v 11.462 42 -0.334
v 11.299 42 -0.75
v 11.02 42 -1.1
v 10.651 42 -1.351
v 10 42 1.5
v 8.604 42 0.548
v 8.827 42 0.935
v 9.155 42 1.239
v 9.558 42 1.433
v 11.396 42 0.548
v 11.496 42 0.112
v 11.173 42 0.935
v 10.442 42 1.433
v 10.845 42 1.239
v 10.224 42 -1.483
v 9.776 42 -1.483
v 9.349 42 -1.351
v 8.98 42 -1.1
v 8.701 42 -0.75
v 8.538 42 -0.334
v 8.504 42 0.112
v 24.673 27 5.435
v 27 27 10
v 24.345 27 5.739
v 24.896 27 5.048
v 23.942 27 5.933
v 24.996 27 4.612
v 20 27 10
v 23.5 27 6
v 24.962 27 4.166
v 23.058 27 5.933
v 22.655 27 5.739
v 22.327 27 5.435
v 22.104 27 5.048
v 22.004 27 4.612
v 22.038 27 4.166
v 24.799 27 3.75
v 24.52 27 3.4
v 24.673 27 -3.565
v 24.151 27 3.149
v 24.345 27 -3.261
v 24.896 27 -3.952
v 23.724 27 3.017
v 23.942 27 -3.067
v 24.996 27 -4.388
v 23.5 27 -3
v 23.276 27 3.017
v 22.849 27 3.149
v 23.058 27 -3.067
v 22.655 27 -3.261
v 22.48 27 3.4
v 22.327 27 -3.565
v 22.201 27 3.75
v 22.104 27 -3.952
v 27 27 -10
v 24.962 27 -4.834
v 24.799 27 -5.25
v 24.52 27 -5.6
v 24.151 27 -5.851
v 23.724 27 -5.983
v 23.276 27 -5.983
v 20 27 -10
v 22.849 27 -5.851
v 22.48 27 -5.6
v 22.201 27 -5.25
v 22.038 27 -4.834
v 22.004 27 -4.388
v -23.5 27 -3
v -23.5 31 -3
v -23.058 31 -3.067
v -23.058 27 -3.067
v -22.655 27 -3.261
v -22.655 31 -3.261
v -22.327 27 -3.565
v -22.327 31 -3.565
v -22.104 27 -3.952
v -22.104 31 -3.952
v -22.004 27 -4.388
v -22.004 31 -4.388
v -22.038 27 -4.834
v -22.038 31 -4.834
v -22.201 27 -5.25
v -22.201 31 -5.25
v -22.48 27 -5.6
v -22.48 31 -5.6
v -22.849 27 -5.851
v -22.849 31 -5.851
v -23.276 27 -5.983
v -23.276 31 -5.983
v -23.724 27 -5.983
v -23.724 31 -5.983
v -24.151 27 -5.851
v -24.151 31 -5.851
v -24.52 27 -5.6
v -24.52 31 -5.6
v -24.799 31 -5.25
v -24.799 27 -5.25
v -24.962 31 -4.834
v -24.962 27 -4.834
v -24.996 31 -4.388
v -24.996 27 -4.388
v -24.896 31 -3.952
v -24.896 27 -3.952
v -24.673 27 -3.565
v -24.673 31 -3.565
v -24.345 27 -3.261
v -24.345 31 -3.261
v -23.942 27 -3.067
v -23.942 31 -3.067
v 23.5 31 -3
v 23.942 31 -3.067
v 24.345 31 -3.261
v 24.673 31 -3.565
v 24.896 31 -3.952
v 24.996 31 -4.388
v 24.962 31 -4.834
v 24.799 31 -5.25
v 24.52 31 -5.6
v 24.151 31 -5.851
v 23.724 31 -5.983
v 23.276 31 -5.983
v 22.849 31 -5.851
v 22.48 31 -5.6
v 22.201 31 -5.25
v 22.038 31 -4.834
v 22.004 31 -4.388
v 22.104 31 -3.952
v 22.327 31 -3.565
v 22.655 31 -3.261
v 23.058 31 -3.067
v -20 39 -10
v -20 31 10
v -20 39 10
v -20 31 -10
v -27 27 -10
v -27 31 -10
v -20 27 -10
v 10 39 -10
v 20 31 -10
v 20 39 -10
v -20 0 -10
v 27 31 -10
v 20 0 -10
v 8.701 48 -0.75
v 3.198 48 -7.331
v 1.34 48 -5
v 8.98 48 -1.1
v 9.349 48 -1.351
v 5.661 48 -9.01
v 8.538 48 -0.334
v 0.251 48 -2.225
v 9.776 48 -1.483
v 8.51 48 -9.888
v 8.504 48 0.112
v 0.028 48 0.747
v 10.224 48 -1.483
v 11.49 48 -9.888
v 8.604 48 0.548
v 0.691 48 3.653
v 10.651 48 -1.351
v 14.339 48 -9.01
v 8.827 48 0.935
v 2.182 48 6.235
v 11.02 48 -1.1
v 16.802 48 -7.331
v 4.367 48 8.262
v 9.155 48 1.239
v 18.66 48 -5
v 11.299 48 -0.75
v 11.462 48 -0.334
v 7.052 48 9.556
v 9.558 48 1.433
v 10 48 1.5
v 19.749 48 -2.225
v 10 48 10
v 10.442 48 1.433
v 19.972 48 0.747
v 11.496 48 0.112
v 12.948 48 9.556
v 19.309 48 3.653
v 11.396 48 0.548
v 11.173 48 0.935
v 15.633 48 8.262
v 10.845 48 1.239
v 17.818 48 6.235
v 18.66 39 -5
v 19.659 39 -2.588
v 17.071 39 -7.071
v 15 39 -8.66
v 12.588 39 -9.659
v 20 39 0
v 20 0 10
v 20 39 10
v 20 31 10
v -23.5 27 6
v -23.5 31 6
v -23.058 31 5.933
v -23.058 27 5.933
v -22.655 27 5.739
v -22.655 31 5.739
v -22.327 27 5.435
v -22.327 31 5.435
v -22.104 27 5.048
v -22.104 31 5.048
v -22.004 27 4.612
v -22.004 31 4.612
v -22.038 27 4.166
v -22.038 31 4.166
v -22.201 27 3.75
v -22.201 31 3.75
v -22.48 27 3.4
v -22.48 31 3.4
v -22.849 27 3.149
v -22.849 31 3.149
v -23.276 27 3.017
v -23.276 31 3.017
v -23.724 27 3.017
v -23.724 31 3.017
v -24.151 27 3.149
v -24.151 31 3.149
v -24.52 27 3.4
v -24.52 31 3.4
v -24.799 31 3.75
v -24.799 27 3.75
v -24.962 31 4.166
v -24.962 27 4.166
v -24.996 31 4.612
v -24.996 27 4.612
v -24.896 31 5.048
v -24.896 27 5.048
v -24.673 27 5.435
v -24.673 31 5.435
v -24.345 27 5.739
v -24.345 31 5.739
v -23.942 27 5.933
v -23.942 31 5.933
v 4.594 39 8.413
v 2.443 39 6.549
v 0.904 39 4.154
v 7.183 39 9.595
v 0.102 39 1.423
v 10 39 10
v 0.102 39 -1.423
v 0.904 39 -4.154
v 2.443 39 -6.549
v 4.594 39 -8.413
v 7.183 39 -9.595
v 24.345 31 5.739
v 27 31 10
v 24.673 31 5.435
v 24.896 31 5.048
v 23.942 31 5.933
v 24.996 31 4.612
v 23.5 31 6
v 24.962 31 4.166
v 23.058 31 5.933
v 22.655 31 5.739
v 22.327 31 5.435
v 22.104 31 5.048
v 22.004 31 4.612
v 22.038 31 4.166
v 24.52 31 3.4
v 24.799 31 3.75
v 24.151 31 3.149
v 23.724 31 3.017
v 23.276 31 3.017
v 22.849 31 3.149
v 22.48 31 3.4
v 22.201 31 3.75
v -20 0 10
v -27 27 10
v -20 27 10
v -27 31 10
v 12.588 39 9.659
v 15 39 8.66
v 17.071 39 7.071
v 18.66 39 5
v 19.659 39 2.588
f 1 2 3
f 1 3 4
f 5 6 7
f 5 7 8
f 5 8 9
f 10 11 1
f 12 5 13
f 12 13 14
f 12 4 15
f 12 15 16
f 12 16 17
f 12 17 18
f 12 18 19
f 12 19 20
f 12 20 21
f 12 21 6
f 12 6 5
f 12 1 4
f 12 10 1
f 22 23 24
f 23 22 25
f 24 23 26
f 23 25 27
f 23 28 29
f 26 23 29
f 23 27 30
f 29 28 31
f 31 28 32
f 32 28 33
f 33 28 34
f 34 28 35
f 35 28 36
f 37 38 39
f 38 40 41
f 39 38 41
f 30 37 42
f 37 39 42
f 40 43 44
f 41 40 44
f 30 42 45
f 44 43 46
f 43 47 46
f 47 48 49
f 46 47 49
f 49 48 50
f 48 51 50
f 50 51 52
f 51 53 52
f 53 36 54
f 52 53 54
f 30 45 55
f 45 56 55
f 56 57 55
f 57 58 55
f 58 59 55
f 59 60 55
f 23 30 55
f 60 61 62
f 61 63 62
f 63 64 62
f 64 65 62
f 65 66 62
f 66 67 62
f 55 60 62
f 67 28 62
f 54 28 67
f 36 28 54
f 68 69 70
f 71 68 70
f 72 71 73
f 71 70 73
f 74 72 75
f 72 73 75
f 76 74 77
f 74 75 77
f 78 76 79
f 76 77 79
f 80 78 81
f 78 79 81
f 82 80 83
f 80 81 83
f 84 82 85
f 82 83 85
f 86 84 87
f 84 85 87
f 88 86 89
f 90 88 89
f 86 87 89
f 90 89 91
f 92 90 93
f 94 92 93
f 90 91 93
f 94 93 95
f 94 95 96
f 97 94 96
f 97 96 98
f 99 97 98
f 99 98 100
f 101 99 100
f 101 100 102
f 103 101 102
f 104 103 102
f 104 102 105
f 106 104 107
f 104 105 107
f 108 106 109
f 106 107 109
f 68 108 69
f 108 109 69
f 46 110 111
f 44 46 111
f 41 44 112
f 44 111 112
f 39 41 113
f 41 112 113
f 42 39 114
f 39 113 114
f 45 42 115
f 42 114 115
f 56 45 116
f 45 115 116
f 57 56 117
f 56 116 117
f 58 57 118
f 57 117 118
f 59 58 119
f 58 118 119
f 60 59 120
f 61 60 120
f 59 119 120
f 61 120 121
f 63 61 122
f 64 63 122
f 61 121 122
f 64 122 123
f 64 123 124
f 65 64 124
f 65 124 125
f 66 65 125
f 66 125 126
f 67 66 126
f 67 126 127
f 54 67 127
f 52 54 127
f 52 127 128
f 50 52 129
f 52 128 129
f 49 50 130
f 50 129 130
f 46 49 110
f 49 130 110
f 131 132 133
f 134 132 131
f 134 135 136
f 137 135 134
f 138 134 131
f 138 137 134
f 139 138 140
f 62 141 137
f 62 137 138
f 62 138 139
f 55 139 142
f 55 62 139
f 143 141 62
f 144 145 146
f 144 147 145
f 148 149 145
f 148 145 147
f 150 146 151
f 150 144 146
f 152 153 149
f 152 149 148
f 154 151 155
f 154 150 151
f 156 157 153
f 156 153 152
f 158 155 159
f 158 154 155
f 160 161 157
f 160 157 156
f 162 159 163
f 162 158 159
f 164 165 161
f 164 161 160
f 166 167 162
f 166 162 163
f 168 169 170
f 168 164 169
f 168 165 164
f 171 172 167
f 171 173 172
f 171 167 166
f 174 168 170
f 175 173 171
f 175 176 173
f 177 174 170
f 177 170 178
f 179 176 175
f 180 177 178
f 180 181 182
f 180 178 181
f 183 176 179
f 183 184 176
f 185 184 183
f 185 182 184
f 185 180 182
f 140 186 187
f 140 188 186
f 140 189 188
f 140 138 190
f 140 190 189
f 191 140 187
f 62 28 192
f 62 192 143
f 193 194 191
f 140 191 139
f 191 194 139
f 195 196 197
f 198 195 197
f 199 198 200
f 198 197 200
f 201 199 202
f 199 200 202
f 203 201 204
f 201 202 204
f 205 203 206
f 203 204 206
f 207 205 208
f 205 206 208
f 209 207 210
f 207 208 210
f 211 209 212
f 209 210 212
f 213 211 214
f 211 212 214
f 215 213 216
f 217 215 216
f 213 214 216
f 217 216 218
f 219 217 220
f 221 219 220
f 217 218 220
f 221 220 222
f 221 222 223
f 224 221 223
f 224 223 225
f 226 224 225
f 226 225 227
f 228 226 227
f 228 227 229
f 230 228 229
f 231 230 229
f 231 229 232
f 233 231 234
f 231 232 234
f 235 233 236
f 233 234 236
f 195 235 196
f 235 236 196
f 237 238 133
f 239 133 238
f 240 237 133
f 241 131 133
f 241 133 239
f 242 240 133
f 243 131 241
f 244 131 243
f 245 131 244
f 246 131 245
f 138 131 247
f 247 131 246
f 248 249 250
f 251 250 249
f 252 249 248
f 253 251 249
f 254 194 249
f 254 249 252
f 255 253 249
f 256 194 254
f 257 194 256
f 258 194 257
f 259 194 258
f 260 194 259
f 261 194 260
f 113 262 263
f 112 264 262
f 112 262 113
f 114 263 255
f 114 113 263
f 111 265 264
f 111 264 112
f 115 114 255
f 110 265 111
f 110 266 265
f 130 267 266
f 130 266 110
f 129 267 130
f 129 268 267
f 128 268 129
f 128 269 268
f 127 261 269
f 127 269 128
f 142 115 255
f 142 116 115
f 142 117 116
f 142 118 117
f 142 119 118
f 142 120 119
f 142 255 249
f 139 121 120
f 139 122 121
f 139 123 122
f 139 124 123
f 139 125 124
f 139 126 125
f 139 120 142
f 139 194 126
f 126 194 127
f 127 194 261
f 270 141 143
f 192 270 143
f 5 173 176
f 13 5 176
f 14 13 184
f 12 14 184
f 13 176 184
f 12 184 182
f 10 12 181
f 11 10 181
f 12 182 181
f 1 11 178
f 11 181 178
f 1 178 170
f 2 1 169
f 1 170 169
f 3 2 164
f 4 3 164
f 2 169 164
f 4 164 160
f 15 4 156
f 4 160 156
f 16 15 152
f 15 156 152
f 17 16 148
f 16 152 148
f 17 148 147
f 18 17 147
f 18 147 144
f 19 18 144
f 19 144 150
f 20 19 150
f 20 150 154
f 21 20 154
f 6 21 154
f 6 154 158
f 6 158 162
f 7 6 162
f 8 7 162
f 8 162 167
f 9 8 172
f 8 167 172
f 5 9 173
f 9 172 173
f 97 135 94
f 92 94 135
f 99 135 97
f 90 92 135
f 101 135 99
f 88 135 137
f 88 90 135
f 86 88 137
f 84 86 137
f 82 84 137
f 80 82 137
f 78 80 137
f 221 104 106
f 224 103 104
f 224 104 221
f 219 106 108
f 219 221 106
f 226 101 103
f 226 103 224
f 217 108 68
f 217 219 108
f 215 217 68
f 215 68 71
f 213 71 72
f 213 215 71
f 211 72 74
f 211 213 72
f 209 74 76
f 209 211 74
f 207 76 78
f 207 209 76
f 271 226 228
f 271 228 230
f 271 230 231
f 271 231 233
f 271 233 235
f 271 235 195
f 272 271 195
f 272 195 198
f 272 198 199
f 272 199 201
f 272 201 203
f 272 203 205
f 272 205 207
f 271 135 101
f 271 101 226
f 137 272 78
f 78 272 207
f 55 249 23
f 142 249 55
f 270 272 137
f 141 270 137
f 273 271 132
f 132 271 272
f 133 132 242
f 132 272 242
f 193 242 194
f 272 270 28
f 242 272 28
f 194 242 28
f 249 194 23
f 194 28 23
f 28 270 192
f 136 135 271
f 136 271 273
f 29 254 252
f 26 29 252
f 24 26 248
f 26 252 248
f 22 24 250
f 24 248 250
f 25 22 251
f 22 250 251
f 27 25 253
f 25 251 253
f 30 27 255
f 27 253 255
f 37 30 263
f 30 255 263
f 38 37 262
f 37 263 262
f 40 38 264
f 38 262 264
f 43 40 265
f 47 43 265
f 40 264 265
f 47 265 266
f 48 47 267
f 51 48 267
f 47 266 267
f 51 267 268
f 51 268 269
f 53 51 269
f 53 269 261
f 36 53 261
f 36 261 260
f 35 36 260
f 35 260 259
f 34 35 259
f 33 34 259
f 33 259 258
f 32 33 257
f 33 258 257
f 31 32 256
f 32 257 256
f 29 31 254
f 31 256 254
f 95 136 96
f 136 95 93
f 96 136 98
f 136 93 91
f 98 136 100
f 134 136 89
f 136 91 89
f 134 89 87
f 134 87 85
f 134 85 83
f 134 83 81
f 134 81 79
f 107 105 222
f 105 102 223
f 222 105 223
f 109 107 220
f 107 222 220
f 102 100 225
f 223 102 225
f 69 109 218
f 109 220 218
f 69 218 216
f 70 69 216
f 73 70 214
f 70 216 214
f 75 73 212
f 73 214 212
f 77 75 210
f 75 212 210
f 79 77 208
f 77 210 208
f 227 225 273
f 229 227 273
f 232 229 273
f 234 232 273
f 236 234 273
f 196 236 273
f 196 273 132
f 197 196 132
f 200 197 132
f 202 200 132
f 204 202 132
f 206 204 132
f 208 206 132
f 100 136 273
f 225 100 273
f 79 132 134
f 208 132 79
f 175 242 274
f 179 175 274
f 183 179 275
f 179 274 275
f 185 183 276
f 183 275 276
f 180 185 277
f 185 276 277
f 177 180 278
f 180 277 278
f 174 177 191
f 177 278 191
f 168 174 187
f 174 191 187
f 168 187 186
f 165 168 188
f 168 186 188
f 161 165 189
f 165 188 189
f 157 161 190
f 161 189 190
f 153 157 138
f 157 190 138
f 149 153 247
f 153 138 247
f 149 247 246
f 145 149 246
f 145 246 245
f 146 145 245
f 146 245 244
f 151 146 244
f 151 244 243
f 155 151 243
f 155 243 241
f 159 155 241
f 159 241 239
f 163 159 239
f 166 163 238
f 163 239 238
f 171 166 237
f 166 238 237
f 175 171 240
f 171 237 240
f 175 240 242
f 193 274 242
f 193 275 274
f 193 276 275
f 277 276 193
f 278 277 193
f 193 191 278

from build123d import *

# Parameters (mm, degrees)
SKETCH_1_W          = 40
SKETCH_1_H          = 20
EXTRUDE_1_DEPTH     = 39
SKETCH_2_W          = 20
SKETCH_2_H          = 4
EXTRUDE_2_DEPTH     = 7
SKETCH_3_R          = 1.5
CUT_EXTRUDE_1_DEPTH = 4
SKETCH_4_W          = 7
SKETCH_4_H          = 4
EXTRUDE_3_DEPTH     = 20
SKETCH_5_R          = 1.5
CUT_EXTRUDE_2_DEPTH = 4
SKETCH_6_R          = 10
EXTRUDE_4_DEPTH     = 9
SKETCH_7_R          = 1.5
CUT_EXTRUDE_3_DEPTH = 6


with BuildPart() as part:
    # Эскиз1 → Бобышка-Вытянуть1 (new body)
    with BuildSketch(Plane(origin=(0, 0, 0), x_dir=(1, 0, 0), z_dir=(0, 1, 0))):
        Rectangle(SKETCH_1_W, SKETCH_1_H)
    extrude(amount=EXTRUDE_1_DEPTH)

    # Эскиз2 → Бобышка-Вытянуть2 (add)
    with BuildSketch(Plane(origin=(20, 0, 0), x_dir=(0, 0, -1), z_dir=(1, 0, 0))):
        with Locations((0, 29)):
            Rectangle(SKETCH_2_W, SKETCH_2_H)
    extrude(amount=EXTRUDE_2_DEPTH)

    # Эскиз3 → Вырез-Вытянуть1 (cut)
    with BuildSketch(Plane(origin=(0, 31, 0), x_dir=(1, 0, 0), z_dir=(0, 1, 0))):
        with Locations(Location((23.5, 4.5, 0), (0, 0, 270))):
            Circle(SKETCH_3_R)
        with Locations(Location((23.5, -4.5, 0), (0, 0, 270))):
            Circle(SKETCH_3_R)
    extrude(amount=-CUT_EXTRUDE_1_DEPTH, mode=Mode.SUBTRACT)

    # Эскиз4 → Бобышка-Вытянуть3 (add)
    with BuildSketch(Plane.XY.offset(10)):
        with Locations((-23.5, 29)):
            Rectangle(SKETCH_4_W, SKETCH_4_H)
    extrude(amount=-EXTRUDE_3_DEPTH)

    # Эскиз5 → Вырез-Вытянуть2 (cut)
    with BuildSketch(Plane(origin=(0, 31, 0), x_dir=(1, 0, 0), z_dir=(0, 1, 0))):
        with Locations(Location((-23.5, -4.5, 0), (0, 0, 270))):
            Circle(SKETCH_5_R)
        with Locations(Location((-23.5, 4.5, 0), (0, 0, 270))):
            Circle(SKETCH_5_R)
    extrude(amount=-CUT_EXTRUDE_2_DEPTH, mode=Mode.SUBTRACT)

    # Эскиз6 → Бобышка-Вытянуть4 (add)
    with BuildSketch(Plane(origin=(0, 39, 0), x_dir=(1, 0, 0), z_dir=(0, 1, 0))):
        with Locations(Location((10, 0, 0), (0, 0, 270))):
            Circle(SKETCH_6_R)
    extrude(amount=EXTRUDE_4_DEPTH)

    # Эскиз7 → Вырез-Вытянуть3 (cut)
    with BuildSketch(Plane(origin=(0, 48, 0), x_dir=(1, 0, 0), z_dir=(0, 1, 0))):
        with Locations(Location((10, 0, 0), (0, 0, 270))):
            Circle(SKETCH_7_R)
    extrude(amount=-CUT_EXTRUDE_3_DEPTH, mode=Mode.SUBTRACT)


solid = part.part
